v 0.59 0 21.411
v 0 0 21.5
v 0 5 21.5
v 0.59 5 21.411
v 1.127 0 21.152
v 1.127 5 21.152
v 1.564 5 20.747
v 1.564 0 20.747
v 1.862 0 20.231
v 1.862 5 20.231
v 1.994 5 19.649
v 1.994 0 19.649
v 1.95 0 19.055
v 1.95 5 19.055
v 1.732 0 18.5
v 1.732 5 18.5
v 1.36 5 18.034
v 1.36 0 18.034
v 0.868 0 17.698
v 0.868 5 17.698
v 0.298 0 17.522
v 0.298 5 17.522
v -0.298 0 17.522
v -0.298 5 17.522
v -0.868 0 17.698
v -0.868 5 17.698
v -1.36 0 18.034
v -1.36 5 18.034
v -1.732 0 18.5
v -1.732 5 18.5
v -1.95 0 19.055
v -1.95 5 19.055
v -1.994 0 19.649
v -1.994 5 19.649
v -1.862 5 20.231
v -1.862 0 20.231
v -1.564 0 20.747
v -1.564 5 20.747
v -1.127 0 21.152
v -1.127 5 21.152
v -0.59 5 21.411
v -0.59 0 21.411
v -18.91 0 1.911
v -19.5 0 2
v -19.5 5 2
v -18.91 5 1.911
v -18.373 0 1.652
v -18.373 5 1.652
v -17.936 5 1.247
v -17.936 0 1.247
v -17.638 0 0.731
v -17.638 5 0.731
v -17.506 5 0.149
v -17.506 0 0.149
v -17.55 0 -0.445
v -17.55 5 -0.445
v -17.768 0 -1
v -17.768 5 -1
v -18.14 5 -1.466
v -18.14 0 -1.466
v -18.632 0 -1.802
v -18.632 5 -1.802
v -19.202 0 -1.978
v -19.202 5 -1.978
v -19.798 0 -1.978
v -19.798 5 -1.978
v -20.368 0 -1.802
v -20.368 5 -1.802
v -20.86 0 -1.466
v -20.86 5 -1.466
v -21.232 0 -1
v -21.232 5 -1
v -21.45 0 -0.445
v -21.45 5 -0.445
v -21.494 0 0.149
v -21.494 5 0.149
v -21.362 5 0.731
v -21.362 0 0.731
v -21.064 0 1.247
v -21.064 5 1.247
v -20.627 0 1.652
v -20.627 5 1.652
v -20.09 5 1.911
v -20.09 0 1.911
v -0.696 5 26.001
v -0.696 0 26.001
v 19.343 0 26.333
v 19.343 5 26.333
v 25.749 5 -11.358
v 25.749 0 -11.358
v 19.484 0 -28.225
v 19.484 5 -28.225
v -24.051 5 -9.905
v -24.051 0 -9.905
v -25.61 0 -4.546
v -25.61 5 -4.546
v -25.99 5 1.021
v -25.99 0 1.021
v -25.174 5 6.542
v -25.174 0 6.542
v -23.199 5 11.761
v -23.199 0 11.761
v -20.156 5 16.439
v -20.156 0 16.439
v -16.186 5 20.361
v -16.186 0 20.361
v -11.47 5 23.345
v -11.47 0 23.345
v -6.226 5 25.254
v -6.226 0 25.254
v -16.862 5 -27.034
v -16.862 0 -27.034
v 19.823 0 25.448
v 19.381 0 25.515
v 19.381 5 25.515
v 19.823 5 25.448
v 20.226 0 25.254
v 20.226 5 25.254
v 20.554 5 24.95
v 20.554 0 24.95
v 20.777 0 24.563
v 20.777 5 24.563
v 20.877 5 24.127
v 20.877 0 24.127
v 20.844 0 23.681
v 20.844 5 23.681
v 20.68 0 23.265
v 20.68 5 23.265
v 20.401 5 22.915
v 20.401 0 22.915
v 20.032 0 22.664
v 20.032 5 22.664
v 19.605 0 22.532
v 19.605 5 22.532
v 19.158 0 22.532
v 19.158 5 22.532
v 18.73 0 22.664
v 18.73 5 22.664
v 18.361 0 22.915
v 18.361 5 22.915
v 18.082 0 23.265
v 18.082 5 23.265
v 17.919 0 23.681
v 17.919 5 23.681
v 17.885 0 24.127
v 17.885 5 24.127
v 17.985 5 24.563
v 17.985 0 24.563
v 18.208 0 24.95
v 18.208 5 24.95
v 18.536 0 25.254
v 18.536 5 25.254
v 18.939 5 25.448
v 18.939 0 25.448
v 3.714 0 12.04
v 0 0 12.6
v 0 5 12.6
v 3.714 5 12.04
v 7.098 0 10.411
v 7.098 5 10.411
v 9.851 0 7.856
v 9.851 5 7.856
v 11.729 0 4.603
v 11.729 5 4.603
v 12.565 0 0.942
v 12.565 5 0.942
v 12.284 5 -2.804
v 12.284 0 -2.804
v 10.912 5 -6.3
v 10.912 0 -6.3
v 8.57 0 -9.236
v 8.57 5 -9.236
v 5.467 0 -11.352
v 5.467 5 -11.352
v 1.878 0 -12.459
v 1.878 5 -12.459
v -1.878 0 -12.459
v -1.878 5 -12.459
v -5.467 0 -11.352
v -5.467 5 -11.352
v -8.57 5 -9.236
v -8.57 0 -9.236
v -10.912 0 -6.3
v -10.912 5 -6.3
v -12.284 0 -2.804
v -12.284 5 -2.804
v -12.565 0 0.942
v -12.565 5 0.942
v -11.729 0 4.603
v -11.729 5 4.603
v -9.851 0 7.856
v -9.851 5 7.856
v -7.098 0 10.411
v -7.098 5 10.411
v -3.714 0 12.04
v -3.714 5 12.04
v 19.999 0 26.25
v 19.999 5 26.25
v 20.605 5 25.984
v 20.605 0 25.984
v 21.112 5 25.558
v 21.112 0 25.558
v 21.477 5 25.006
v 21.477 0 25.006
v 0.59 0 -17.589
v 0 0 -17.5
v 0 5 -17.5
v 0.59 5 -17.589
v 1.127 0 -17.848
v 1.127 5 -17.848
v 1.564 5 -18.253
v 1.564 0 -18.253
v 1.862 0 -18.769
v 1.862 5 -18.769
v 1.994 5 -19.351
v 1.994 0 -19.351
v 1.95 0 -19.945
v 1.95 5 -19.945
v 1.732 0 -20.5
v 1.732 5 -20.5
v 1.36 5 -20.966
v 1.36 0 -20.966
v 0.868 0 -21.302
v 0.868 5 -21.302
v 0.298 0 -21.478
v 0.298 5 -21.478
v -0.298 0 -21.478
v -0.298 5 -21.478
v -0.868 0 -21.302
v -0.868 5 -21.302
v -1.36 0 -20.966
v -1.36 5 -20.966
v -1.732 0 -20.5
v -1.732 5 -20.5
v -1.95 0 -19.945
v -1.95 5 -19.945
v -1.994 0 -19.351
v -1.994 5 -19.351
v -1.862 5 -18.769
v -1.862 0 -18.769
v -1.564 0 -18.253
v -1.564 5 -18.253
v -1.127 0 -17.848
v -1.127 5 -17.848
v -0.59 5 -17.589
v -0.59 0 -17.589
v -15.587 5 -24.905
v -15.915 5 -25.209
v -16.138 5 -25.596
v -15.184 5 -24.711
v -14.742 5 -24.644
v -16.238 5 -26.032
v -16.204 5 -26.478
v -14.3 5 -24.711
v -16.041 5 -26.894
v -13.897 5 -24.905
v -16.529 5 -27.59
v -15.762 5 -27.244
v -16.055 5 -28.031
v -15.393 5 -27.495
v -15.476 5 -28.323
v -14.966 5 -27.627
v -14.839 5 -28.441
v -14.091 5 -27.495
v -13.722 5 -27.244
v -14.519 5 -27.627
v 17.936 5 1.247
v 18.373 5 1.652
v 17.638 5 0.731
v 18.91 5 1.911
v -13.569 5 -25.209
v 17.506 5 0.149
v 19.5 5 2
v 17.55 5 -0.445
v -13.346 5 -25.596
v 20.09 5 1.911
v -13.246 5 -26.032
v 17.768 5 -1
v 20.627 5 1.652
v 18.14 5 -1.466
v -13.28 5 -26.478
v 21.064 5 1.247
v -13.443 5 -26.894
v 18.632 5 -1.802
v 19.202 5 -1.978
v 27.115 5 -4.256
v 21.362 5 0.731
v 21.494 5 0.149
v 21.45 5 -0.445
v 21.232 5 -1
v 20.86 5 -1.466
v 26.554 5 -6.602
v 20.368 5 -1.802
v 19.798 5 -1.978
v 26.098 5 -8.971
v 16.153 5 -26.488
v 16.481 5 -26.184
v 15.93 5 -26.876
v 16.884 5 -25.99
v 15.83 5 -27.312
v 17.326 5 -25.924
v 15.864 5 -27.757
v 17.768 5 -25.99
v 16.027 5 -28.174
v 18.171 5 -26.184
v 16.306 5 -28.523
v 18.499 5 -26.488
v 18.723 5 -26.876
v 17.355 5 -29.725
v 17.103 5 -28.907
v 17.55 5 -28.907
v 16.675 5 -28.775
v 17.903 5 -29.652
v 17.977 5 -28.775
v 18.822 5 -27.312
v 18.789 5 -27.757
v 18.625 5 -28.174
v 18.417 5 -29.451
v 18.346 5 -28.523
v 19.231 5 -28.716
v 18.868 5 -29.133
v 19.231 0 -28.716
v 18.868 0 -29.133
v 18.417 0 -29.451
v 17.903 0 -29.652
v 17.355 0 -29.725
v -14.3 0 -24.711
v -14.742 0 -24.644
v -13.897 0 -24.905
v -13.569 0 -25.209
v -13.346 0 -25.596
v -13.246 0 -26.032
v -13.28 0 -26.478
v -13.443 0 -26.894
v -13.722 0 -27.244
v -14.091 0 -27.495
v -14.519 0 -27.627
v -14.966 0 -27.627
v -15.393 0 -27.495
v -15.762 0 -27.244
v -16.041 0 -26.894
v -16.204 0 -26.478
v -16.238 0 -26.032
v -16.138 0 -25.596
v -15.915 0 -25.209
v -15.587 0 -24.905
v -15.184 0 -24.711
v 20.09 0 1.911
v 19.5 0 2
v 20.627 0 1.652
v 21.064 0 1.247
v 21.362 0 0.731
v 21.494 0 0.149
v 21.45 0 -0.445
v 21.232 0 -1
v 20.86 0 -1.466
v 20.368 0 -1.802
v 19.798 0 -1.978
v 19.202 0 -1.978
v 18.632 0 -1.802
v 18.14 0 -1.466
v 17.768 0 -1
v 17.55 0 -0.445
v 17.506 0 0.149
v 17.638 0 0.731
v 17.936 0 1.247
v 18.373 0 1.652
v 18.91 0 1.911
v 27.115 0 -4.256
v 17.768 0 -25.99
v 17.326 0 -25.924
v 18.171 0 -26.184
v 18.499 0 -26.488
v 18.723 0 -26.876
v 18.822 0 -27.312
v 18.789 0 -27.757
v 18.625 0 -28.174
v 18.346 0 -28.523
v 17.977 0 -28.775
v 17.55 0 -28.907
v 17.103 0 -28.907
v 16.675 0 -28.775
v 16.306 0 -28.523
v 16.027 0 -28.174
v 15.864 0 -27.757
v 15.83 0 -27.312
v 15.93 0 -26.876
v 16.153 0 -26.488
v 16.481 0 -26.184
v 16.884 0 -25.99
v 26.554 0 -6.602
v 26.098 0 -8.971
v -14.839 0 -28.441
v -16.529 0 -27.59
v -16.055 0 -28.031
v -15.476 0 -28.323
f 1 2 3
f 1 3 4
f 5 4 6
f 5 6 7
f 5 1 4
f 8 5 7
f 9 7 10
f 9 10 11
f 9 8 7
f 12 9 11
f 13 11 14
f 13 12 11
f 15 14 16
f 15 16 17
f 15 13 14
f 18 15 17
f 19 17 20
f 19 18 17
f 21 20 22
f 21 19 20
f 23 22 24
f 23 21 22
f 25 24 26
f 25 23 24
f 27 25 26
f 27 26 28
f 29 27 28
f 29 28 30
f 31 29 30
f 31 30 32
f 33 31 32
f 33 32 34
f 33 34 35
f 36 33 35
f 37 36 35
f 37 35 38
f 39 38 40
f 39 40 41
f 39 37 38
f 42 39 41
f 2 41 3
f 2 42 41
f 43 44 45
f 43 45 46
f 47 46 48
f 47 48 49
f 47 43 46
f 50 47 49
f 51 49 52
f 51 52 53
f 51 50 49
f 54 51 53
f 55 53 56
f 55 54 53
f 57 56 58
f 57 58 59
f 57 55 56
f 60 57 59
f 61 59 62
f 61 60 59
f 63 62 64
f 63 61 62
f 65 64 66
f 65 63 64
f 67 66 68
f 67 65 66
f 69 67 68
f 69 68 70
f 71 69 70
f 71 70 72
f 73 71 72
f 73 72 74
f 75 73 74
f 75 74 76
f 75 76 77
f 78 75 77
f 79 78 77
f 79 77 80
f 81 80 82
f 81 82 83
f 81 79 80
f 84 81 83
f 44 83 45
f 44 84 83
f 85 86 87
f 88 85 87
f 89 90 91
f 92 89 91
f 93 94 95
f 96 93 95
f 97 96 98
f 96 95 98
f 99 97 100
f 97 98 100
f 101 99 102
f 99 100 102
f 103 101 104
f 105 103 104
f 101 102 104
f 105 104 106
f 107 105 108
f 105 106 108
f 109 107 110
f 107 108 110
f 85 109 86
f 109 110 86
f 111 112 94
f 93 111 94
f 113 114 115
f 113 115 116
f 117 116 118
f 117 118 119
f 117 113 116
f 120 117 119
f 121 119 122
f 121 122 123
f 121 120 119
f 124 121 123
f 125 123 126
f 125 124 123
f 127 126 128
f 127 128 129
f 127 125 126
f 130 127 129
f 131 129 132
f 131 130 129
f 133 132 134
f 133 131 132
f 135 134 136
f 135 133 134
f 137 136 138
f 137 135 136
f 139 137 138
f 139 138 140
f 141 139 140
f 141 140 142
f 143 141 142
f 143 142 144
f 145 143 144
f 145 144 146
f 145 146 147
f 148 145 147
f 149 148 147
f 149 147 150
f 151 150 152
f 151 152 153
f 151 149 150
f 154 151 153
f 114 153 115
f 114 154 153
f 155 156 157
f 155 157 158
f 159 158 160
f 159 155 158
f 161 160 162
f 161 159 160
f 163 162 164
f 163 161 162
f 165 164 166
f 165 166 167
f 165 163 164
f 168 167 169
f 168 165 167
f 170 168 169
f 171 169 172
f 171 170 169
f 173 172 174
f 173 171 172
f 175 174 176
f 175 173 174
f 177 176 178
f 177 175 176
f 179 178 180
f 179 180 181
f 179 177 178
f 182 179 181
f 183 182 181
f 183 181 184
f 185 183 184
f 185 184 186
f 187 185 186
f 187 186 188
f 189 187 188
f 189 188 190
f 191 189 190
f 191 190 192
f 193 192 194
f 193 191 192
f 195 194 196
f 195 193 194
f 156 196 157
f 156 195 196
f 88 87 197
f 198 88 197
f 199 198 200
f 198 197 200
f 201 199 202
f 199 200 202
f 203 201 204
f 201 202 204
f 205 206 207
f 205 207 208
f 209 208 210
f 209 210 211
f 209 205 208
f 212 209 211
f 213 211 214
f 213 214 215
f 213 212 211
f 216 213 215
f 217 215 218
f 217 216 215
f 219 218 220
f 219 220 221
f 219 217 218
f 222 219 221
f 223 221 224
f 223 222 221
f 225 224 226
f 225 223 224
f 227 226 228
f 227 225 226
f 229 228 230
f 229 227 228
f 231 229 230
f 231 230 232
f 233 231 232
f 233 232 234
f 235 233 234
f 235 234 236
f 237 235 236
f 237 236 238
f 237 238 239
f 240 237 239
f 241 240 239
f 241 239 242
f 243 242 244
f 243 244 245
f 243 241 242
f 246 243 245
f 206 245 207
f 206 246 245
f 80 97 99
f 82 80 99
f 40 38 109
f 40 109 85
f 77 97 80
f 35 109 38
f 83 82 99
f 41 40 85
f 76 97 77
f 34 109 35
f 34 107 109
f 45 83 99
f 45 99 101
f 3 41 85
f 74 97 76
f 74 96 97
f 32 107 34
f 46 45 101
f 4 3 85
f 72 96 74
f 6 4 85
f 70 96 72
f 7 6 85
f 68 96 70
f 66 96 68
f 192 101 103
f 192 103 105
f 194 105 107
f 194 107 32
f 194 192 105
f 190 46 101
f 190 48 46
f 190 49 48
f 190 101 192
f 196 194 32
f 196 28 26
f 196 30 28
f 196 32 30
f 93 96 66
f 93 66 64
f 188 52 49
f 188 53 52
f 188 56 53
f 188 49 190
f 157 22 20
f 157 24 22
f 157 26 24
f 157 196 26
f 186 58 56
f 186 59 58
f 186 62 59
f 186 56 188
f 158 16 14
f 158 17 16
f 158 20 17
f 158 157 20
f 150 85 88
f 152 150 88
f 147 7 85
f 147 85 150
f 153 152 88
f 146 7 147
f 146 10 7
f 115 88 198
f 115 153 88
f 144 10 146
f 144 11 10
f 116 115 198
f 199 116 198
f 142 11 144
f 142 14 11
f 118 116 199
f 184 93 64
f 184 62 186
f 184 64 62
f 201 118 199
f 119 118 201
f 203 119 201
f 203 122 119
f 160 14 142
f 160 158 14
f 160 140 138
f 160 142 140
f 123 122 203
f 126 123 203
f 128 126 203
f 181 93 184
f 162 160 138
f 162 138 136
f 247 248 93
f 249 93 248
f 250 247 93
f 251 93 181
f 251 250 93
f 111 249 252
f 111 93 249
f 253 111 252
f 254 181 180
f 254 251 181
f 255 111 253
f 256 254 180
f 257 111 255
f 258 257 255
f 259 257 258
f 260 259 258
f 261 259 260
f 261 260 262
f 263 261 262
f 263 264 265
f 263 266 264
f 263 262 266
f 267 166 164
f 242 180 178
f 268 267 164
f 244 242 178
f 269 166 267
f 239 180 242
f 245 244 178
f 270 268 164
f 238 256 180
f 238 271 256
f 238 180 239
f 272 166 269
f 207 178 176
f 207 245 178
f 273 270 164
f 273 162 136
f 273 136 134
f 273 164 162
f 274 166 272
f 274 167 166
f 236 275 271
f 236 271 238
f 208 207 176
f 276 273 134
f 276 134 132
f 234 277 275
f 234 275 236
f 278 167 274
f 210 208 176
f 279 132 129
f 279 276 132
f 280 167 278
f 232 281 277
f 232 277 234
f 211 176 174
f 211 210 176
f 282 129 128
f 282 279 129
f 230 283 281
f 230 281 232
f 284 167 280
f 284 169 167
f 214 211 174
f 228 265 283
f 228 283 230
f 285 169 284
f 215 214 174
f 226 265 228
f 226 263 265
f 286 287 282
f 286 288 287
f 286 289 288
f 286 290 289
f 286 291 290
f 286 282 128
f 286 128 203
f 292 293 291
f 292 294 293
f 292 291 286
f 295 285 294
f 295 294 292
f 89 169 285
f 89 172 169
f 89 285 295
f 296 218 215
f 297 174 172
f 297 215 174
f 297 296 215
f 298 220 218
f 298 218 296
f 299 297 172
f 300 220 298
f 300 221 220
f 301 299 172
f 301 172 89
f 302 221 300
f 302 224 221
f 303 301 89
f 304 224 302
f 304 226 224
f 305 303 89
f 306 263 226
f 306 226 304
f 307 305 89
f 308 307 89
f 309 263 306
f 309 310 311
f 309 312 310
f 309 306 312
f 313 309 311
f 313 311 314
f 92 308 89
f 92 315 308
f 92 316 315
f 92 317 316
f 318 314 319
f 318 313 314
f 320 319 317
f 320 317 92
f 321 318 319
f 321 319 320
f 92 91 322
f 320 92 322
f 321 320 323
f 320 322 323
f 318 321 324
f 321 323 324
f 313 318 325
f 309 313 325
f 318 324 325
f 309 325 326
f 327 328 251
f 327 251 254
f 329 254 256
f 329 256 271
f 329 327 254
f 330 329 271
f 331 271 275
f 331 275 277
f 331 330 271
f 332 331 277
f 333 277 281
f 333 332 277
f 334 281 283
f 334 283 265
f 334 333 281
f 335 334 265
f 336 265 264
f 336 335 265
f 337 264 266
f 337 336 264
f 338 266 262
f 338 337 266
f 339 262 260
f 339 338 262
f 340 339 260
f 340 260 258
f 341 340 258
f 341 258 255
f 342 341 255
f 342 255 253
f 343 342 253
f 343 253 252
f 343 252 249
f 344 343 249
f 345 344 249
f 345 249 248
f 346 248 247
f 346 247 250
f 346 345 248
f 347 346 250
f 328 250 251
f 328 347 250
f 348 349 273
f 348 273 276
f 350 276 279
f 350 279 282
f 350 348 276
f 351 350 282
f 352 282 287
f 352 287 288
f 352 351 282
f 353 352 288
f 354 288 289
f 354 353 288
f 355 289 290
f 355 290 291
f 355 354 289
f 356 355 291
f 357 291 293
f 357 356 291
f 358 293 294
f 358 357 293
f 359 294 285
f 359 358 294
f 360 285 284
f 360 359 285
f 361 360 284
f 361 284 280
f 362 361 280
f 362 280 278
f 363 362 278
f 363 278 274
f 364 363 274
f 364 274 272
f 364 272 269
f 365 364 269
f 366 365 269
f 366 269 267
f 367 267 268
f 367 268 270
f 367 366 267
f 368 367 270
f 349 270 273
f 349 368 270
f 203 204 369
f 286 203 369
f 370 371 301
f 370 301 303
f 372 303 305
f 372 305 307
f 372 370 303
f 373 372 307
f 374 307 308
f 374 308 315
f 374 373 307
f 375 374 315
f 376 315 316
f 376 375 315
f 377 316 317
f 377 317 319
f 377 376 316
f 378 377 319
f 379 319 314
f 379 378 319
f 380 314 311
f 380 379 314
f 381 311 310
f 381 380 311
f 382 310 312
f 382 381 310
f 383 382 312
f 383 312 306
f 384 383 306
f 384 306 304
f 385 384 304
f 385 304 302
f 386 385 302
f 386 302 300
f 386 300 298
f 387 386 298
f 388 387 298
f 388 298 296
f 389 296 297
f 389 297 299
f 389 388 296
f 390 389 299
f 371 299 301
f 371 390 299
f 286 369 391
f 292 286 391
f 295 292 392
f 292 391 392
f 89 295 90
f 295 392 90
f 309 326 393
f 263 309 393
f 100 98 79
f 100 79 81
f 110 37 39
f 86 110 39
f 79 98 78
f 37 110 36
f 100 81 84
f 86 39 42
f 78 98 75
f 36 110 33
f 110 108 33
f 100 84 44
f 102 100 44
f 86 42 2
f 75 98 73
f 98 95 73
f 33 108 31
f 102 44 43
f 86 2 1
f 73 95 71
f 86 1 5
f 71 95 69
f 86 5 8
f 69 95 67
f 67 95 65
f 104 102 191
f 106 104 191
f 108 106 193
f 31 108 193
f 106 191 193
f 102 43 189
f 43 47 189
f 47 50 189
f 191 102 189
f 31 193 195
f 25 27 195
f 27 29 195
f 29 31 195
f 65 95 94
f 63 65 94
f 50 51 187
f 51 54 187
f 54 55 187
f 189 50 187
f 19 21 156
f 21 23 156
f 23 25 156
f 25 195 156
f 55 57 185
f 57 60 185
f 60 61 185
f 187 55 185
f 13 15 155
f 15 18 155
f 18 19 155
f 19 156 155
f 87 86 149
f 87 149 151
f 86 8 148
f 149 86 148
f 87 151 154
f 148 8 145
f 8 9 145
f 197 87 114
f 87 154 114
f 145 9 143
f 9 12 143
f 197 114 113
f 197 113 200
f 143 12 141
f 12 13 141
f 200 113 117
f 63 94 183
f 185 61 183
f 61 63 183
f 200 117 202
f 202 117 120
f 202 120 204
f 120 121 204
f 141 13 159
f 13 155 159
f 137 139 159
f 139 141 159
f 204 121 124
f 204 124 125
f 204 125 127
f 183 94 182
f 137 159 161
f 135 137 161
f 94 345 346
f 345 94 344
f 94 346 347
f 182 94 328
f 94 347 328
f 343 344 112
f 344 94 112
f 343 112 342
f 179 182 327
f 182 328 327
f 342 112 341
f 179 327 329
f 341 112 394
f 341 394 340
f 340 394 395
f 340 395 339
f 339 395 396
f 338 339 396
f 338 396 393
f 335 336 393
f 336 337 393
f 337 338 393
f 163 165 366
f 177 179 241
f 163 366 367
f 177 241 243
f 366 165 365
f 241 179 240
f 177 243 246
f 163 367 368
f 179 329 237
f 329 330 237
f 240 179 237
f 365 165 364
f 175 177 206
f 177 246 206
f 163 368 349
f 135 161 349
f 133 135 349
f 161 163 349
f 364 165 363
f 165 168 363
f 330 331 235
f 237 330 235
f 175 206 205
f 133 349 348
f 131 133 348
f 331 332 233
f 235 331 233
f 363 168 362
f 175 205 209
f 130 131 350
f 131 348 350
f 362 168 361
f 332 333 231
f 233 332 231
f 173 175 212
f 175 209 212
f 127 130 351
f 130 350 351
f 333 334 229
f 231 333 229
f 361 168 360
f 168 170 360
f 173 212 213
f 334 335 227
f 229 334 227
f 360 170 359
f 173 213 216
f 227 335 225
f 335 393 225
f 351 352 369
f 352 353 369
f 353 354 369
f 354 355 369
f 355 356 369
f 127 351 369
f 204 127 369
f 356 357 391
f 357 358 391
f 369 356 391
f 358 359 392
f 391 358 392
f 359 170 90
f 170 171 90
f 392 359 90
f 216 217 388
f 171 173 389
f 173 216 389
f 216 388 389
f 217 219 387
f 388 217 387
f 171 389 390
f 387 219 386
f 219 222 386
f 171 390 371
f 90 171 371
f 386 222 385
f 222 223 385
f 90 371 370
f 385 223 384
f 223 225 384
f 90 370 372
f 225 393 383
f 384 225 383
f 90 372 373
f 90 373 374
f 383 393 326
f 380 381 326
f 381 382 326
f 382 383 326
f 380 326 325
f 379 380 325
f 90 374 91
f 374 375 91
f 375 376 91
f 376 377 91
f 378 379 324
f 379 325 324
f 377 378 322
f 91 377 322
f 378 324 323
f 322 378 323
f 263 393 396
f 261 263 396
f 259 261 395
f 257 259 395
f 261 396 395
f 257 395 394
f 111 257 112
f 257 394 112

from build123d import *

# Parameters (mm, degrees)
SKETCH1_R           = 2
SKETCH1_R_2         = 12.6
SKETCH1_R_3         = 1.5
BOSS_EXTRUDE1_DEPTH = 5


with BuildPart() as part:
    # Sketch1 → Boss-Extrude1 (new body)
    with BuildSketch(Plane(origin=(0, 0, 0), x_dir=(1, 0, 0), z_dir=(0, 1, 0))):
        with BuildLine():
            Line((-0.695602201, -26.001013021), (19.342742394, -26.333158484))
            ThreePointArc((19.342742394, -26.333158484), (20.605232337, -25.984002388), (21.476990945, -25.006337943))
            Line((21.476990945, -25.006337943), (27.115129107, 4.255894982))
            ThreePointArc((27.115129107, 4.255894982), (26.312930803, 7.784075148), (25.748803556, 11.35805582))
            Line((25.748803556, 11.35805582), (19.484079103, 28.225152951))
            ThreePointArc((19.484079103, 28.225152951), (18.652270353, 29.305251267), (17.355348812, 29.725385394))
            Line((17.355348812, 29.725385394), (-14.839037586, 28.440806231))
            ThreePointArc((-14.839037586, 28.440806231), (-16.054862276, 28.031135004), (-16.861770169, 27.033658807))
            Line((-16.861770169, 27.033658807), (-24.050617364, 9.90476375))
            ThreePointArc((-24.050617364, 9.90476375), (-21.803670495, -14.182259815), (-0.695602201, -26.001013021))
        make_face()
        with Locations(Location((0, 19.5, 0), (0, 0, 270))):
            Circle(SKETCH1_R, mode=Mode.SUBTRACT)
        with Locations(Location((19.5, 0, 0), (0, 0, 270))):
            Circle(SKETCH1_R, mode=Mode.SUBTRACT)
        with Locations(Location((0, -19.5, 0), (0, 0, 270))):
            Circle(SKETCH1_R, mode=Mode.SUBTRACT)
        with Locations(Location((-19.5, 0, 0), (0, 0, 270))):
            Circle(SKETCH1_R, mode=Mode.SUBTRACT)
        with Locations(Location((0, 0, 0), (0, 0, 270))):
            Circle(SKETCH1_R_2, mode=Mode.SUBTRACT)
        with Locations(Location((19.381166369, -24.015039037, 0), (0, 0, 270))):
            Circle(SKETCH1_R_3, mode=Mode.SUBTRACT)
        with Locations(Location((17.326233239, 27.42369259, 0), (0, 0, 270))):
            Circle(SKETCH1_R_3, mode=Mode.SUBTRACT)
        with Locations(Location((-14.742076054, 26.144041757, 0), (0, 0, 270))):
            Circle(SKETCH1_R_3, mode=Mode.SUBTRACT)
    extrude(amount=BOSS_EXTRUDE1_DEPTH)


solid = part.part
